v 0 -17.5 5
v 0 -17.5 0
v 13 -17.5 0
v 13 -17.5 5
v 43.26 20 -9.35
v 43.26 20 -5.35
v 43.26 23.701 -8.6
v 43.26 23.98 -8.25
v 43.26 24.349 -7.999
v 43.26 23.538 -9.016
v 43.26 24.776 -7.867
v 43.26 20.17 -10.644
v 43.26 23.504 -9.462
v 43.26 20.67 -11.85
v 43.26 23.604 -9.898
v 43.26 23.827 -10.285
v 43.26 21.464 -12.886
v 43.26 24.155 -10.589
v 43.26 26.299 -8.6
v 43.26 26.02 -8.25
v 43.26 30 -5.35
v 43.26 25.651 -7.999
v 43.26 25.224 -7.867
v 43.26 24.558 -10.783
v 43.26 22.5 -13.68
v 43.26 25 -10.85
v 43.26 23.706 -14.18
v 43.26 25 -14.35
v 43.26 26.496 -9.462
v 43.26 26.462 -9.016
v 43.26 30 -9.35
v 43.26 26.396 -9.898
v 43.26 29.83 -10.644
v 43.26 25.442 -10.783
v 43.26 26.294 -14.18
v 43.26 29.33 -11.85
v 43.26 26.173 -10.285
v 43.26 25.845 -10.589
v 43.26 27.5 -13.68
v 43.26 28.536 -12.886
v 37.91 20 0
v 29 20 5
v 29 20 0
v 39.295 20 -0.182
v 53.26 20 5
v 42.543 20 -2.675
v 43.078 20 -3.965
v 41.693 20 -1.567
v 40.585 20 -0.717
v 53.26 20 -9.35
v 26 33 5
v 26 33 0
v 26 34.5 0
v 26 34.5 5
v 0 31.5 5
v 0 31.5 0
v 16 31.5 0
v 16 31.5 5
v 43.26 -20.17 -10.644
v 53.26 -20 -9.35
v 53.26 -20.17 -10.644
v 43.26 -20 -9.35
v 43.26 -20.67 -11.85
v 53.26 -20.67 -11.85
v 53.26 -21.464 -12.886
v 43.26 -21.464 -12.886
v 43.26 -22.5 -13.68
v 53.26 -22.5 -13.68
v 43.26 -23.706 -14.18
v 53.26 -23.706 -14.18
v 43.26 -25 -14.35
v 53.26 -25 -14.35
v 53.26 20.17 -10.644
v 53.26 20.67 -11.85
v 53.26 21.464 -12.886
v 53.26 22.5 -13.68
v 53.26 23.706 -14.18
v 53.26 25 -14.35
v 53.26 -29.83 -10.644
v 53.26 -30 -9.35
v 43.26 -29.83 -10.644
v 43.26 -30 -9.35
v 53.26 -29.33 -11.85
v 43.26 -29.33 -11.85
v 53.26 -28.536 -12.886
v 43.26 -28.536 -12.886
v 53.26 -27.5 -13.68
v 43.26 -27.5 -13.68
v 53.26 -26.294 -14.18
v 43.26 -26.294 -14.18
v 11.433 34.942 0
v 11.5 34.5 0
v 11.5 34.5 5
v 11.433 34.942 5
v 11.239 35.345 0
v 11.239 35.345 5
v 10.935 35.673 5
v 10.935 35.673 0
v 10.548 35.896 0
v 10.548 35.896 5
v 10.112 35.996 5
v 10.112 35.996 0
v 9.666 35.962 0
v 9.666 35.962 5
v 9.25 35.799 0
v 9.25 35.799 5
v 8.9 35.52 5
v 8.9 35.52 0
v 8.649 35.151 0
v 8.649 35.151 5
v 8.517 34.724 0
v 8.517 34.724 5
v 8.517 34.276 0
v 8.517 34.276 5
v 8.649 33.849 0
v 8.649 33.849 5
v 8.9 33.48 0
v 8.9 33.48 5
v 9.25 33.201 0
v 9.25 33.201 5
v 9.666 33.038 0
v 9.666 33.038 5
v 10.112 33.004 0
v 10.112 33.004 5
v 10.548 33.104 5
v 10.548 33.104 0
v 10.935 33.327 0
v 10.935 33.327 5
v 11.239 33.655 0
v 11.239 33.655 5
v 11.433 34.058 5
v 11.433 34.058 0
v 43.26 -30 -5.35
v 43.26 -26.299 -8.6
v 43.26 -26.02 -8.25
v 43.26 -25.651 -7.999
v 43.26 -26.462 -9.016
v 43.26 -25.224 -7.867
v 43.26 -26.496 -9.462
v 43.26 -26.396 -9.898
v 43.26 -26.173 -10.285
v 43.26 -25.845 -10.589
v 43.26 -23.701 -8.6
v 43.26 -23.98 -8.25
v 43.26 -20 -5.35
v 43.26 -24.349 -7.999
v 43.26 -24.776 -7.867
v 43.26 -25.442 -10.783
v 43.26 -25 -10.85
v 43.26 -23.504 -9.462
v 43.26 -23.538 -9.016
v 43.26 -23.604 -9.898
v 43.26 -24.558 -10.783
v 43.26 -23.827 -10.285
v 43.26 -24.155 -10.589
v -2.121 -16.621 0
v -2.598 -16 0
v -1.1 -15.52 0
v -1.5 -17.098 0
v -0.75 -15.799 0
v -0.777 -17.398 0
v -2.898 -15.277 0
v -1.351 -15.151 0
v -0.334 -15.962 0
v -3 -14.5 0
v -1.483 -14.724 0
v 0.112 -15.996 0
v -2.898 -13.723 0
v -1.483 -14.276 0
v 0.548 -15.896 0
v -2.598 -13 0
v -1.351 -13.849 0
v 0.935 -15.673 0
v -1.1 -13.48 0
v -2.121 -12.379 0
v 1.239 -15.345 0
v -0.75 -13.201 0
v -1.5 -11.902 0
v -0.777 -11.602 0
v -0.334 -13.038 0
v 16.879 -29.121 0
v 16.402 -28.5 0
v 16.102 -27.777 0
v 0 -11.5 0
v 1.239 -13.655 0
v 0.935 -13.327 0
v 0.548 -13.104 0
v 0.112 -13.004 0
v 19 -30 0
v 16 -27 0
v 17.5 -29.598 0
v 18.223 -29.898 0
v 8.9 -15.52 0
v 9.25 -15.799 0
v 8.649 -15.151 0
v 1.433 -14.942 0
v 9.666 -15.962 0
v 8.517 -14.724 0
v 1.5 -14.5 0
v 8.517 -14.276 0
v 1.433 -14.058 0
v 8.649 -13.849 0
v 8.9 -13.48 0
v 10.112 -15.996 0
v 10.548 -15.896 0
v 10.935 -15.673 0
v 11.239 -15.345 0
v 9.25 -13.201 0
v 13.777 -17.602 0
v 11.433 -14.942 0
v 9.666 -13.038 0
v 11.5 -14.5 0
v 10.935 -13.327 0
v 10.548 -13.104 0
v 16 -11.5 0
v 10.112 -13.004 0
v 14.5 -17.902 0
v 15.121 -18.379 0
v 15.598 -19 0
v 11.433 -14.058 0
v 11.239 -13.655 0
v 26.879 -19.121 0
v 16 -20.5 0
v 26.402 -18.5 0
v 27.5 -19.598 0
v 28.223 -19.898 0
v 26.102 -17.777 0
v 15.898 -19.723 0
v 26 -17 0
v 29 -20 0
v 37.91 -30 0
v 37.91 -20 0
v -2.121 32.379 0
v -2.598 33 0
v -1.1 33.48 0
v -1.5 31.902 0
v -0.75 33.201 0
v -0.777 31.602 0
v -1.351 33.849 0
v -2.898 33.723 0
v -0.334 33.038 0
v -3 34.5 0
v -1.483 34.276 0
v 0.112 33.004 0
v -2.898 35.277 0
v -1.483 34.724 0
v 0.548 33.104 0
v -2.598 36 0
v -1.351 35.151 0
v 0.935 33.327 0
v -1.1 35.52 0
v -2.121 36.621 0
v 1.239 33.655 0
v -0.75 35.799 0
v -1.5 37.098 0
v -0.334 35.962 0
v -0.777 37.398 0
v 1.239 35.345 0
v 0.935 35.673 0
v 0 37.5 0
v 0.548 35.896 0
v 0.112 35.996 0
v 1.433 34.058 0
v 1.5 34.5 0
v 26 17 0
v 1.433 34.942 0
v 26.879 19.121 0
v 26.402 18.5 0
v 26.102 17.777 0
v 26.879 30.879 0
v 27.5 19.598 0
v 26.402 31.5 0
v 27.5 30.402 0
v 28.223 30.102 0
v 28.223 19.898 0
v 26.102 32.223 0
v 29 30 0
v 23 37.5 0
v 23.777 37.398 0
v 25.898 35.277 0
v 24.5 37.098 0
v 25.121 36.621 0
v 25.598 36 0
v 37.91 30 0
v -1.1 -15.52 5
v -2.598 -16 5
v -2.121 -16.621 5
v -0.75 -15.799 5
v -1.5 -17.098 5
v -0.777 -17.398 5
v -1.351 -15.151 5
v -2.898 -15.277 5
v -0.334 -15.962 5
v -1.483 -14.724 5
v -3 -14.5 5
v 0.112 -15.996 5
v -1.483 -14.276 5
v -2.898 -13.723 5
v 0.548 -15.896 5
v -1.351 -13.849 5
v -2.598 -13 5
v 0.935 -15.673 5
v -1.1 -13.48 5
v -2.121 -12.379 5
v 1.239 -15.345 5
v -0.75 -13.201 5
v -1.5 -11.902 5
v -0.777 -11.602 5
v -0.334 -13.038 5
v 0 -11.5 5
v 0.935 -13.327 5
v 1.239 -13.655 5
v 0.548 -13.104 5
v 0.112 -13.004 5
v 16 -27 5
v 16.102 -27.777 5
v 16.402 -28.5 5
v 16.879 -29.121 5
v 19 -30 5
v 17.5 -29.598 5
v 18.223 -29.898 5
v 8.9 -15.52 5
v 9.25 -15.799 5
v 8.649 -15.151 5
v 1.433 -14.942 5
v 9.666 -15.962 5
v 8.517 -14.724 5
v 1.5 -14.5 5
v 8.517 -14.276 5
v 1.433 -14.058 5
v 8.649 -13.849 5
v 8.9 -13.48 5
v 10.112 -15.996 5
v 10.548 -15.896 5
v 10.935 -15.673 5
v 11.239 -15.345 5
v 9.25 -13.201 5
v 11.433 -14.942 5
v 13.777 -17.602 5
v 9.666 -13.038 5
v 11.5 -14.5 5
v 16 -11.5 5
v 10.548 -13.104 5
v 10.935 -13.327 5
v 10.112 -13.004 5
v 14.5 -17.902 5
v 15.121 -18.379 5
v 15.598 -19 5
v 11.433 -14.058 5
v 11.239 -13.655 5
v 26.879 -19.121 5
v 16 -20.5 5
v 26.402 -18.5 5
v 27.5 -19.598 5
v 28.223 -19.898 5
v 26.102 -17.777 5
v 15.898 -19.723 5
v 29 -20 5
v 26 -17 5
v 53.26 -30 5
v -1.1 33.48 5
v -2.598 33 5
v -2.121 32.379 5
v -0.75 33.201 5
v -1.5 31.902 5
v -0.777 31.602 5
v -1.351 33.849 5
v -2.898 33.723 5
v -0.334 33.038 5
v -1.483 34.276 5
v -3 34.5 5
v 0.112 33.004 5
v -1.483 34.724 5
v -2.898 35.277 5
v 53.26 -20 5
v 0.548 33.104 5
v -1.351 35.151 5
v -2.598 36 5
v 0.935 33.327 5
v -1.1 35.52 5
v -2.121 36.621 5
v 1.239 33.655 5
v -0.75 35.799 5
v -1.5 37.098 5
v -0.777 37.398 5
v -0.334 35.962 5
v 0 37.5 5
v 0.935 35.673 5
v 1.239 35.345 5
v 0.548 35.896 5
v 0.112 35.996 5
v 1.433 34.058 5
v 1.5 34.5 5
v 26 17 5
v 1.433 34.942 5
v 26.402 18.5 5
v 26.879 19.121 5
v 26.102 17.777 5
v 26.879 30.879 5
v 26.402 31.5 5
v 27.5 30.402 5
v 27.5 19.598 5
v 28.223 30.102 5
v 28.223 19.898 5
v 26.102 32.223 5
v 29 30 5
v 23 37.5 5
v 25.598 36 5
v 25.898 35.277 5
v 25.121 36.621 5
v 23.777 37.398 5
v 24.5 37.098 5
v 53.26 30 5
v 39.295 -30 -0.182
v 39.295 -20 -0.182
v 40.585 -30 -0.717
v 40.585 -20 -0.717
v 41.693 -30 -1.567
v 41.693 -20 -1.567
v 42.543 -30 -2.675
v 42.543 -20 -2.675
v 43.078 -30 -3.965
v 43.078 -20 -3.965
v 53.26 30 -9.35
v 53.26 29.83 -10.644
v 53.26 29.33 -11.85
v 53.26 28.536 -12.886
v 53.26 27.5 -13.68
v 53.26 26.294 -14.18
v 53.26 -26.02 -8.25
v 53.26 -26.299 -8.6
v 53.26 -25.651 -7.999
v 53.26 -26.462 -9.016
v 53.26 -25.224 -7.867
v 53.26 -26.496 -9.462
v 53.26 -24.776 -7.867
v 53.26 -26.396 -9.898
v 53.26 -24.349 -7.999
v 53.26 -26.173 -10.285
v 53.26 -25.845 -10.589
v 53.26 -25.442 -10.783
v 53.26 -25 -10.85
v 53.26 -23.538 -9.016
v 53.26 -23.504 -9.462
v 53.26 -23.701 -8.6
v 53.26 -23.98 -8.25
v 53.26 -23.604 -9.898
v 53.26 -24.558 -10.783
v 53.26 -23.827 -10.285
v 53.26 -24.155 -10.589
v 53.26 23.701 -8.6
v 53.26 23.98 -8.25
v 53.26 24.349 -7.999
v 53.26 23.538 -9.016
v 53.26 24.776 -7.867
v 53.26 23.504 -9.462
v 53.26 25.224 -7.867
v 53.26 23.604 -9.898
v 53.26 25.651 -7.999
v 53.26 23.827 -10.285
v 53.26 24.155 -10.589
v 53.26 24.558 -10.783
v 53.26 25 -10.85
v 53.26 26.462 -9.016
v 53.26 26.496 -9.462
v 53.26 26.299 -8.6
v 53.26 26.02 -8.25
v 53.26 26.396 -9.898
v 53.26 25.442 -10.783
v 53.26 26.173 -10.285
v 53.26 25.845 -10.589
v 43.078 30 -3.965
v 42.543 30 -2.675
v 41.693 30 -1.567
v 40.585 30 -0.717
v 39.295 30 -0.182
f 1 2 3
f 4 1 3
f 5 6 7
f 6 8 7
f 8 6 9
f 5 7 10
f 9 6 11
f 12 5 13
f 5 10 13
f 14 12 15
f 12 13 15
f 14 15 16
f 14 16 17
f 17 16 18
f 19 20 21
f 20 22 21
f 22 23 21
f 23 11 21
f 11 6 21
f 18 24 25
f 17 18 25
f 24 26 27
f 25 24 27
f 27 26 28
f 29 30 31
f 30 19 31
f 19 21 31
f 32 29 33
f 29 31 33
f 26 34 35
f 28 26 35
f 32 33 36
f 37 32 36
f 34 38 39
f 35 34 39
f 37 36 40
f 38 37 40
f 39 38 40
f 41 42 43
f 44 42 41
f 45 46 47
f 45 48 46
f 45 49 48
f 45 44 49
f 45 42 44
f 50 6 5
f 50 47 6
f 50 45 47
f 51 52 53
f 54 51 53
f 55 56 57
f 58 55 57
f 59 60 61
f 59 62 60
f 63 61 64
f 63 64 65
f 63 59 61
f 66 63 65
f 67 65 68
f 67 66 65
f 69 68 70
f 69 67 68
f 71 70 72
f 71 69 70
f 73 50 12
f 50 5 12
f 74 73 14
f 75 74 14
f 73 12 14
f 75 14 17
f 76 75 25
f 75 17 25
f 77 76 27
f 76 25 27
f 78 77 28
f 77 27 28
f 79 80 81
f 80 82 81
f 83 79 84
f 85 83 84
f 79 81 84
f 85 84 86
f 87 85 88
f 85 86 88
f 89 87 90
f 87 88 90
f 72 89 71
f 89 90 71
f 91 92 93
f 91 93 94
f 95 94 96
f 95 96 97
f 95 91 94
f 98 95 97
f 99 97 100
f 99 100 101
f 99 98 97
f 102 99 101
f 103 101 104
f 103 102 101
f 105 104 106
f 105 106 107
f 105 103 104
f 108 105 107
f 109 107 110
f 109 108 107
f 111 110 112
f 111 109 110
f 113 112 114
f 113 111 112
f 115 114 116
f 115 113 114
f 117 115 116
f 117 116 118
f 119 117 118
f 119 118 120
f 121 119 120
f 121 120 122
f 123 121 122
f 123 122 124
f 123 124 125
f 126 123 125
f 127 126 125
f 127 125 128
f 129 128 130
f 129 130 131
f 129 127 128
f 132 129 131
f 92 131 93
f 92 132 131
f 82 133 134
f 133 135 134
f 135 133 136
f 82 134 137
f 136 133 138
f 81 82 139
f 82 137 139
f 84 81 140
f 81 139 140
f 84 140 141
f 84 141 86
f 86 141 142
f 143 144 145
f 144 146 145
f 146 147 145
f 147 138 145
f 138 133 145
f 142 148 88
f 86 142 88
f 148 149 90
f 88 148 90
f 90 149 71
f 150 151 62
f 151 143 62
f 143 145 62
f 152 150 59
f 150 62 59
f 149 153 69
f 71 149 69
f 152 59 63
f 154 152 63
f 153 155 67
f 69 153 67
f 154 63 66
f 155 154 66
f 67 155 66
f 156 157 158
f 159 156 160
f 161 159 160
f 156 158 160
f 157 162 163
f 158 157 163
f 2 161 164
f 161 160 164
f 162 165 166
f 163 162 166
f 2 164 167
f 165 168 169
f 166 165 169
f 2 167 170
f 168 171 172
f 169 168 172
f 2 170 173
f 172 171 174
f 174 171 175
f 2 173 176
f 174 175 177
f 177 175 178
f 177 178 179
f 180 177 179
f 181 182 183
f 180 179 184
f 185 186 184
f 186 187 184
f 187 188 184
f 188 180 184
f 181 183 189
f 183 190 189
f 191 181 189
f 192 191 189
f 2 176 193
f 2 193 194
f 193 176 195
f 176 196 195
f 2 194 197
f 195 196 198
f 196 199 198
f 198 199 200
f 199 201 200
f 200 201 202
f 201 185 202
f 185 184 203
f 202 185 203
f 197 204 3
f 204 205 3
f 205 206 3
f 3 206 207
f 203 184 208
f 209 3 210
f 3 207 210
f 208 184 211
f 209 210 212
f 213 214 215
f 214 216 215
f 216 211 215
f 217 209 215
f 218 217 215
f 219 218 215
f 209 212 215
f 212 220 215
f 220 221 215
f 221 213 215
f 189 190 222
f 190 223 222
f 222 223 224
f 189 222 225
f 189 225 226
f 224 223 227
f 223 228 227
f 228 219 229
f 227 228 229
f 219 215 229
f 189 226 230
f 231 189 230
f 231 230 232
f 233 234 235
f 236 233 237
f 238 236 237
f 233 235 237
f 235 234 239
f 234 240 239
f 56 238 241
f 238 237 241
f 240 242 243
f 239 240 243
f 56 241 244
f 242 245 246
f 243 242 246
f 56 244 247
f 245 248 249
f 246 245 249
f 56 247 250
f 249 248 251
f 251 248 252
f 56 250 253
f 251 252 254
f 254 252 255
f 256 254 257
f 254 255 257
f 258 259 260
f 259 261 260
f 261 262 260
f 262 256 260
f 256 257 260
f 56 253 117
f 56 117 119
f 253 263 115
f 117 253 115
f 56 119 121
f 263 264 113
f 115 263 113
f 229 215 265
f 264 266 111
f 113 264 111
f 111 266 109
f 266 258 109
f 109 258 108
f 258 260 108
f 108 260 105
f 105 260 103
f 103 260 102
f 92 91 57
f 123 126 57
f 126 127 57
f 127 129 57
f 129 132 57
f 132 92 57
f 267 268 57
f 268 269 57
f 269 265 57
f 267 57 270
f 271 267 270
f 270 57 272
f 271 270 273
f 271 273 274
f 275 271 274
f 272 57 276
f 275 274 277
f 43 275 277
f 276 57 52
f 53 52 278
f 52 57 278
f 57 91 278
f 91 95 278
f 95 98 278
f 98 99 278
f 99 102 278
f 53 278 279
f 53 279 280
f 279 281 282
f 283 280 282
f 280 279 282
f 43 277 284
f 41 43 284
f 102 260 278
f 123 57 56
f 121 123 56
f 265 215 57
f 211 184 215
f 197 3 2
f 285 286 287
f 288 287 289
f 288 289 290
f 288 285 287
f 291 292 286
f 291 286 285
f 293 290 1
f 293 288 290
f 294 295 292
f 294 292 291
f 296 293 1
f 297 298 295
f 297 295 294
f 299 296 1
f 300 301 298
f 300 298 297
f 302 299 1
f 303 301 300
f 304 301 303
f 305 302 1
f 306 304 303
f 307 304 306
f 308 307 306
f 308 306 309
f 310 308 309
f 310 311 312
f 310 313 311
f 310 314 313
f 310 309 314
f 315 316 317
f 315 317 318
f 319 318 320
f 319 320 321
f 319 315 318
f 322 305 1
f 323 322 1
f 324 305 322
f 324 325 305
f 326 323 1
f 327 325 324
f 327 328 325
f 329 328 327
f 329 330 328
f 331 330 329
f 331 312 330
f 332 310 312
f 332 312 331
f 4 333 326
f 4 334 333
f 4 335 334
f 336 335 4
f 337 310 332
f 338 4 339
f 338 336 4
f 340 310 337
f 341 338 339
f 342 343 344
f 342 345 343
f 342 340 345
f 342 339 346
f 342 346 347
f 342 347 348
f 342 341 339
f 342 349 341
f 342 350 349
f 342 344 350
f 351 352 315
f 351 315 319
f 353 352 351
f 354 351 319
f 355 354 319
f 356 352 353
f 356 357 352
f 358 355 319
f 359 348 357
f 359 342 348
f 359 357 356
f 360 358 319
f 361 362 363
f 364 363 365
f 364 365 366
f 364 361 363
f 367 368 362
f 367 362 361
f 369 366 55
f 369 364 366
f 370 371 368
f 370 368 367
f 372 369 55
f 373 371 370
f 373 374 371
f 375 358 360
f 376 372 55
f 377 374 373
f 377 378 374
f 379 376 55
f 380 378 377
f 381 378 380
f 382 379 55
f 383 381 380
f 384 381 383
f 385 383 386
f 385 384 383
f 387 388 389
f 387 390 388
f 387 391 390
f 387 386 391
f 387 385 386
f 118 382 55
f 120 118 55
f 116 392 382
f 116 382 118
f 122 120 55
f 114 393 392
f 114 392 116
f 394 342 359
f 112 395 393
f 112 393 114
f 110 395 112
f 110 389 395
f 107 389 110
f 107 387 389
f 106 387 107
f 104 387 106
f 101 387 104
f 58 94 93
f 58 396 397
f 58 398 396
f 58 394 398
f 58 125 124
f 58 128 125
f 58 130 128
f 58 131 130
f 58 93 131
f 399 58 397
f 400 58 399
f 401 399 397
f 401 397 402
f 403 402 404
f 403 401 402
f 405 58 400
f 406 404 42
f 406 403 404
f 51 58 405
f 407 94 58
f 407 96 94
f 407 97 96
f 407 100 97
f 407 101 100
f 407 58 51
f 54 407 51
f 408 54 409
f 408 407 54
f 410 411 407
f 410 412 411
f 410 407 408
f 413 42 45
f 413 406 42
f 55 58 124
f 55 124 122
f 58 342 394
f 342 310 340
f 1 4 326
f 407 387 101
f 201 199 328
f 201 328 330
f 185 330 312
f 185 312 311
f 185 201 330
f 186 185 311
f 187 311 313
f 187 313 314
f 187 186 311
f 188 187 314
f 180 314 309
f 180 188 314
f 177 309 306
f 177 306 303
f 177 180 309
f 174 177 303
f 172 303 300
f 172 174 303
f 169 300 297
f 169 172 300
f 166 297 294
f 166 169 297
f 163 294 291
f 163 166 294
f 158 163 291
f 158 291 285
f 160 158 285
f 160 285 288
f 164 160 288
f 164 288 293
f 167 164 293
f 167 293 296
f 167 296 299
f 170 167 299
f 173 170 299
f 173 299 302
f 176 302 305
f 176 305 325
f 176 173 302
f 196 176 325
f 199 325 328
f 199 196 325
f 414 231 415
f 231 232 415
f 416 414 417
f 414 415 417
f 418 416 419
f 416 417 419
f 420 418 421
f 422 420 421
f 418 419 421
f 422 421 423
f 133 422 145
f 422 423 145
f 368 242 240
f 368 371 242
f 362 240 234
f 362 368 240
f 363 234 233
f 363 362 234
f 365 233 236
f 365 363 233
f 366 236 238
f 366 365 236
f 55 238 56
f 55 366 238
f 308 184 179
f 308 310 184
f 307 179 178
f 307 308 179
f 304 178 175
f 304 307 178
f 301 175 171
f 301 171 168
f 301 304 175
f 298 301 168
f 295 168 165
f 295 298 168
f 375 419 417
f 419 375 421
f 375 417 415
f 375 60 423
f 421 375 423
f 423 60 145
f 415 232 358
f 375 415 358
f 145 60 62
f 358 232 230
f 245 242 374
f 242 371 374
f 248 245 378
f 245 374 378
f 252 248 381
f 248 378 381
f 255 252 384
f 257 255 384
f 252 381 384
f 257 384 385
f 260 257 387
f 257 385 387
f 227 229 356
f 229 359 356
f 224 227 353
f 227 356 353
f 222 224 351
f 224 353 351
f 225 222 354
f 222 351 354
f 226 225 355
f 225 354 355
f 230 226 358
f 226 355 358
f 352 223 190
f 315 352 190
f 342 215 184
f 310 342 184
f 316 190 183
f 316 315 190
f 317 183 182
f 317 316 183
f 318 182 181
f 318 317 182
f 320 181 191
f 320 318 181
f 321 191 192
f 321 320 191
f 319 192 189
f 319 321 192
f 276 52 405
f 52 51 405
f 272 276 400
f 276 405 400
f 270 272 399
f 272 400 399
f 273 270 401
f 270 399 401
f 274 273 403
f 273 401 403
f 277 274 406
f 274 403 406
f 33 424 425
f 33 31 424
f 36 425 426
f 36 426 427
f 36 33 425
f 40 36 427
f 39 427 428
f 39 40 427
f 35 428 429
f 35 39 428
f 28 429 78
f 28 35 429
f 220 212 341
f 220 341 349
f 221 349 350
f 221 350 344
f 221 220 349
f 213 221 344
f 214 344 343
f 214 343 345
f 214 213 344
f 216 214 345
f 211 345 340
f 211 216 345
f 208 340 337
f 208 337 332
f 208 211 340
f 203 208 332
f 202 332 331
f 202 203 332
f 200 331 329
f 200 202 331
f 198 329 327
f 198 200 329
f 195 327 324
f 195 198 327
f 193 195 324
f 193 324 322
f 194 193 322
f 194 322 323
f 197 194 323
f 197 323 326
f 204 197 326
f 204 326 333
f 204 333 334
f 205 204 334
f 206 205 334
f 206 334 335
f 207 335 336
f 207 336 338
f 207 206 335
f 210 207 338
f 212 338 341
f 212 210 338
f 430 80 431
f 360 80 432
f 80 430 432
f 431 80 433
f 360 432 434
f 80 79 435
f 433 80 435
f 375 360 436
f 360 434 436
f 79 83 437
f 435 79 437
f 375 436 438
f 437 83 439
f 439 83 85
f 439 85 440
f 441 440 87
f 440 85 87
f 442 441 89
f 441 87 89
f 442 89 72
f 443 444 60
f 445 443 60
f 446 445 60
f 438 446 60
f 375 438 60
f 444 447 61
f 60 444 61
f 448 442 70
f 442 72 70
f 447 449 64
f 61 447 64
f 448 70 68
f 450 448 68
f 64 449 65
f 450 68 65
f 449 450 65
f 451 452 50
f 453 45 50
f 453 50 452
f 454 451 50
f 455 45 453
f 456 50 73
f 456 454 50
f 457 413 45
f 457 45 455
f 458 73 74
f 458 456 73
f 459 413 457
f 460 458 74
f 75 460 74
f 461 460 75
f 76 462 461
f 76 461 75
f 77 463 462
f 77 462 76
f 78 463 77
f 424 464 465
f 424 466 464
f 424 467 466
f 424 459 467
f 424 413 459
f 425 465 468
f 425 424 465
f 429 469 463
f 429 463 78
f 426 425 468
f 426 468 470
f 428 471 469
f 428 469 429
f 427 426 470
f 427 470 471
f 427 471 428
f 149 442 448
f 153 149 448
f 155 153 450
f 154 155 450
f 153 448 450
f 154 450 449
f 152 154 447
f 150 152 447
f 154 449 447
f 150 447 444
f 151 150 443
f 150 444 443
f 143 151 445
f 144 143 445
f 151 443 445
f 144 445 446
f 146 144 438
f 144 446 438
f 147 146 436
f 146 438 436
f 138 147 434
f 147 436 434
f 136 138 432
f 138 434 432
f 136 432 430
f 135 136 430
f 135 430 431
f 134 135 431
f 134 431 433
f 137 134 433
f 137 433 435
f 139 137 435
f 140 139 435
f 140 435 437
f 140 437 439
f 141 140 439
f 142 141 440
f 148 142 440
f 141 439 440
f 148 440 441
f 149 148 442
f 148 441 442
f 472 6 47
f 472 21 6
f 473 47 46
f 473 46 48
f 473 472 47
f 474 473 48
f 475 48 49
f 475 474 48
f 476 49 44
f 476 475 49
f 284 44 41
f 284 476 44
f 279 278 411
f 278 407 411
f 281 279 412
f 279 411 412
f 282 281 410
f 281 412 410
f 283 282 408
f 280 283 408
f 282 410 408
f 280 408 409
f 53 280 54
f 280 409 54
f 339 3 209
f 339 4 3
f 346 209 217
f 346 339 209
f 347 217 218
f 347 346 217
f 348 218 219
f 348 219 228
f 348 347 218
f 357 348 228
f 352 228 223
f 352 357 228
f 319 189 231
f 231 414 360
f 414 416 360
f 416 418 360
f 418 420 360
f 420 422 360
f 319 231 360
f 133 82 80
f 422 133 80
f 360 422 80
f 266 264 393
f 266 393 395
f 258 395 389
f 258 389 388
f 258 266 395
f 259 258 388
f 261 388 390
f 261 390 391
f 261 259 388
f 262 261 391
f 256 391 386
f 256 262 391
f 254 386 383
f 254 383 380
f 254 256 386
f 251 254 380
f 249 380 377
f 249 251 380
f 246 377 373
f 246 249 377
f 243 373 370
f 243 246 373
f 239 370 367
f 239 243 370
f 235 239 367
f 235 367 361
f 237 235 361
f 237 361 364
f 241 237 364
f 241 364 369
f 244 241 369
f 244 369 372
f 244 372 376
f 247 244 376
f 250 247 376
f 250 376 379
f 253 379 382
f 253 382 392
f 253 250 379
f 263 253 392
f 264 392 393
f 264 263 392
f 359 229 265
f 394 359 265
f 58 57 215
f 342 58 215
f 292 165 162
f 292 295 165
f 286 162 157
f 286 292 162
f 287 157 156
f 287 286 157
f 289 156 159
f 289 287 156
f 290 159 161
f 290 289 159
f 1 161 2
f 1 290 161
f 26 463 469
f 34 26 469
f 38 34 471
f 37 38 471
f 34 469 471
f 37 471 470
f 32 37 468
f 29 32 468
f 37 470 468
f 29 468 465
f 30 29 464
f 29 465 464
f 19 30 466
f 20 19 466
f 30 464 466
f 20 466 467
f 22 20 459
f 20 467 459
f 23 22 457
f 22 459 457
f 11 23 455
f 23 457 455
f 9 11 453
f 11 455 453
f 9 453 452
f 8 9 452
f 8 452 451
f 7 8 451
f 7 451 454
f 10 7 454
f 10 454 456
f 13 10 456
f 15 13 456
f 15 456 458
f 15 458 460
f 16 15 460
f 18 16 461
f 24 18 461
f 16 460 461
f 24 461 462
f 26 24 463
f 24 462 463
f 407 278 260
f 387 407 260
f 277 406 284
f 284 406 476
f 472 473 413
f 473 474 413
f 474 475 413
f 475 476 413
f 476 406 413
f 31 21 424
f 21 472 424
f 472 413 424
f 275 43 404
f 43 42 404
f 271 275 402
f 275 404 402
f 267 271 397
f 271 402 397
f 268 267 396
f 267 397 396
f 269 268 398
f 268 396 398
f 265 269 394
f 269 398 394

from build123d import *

# Parameters (mm, degrees)
SKETCH_1_R      = 1.5
EXTRUDE_1_DEPTH = 5
FILLET_1_R      = 3
SKETCH_2_W      = 14.35
SKETCH_2_H      = 10
SKETCH_2_R      = 1.5
EXTRUDE_2_DEPTH = 10
FILLET_2_R      = 5
FILLET_4_R      = 5.35


with BuildPart() as part:
    # 草图1 → 凸台-拉伸1 (new body)
    with BuildSketch(Plane.XY):
        Polygon((-3, 37.5), (-3, 31.5), (16, 31.5), (16, -11.5), (-3, -11.5), (-3, -17.5), (16, -17.5), (16, -30), (26, -30), (53.26, -30), (53.26, -20), (26, -20), (26, -17.5), (26, 20), (53.26, 20), (53.26, 30), (26, 30), (26, 37.5), align=None)
        with Locations((0, -14.5)):
            Circle(SKETCH_1_R, mode=Mode.SUBTRACT)
        with Locations((0, 34.5)):
            Circle(SKETCH_1_R, mode=Mode.SUBTRACT)
        with Locations((10, 34.5)):
            Circle(SKETCH_1_R, mode=Mode.SUBTRACT)
        with Locations((10, -14.5)):
            Circle(SKETCH_1_R, mode=Mode.SUBTRACT)
    extrude(amount=EXTRUDE_1_DEPTH)

    # 圆角1
    fillet_1_edges = [part.edges().sort_by_distance(p)[0] for p in [
        (26, 20, 2.5),
        (26, -20, 2.5),
        (26, 30, 2.5),
        (26, 37.5, 2.5),
        (16, -30, 2.5),
        (16, -17.5, 2.5),
        (-3, -17.5, 2.5),
        (-3, -11.5, 2.5),
        (-3, 37.5, 2.5),
        (-3, 31.5, 2.5),
    ]]
    fillet(fillet_1_edges, radius=FILLET_1_R - 0.0001)  # a hair under: the kernel refuses the full size

    # 草图2 → 凸台-拉伸2 (add)
    # profile 1 of 2: a face of its own
    with BuildSketch(Plane(origin=(53.26, 0, 0), x_dir=(0, 0, -1), z_dir=(1, 0, 0))):
        with Locations((7.175, 25)):
            Rectangle(SKETCH_2_W, SKETCH_2_H)
        with Locations((9.35, 25)):
            Circle(SKETCH_2_R, mode=Mode.SUBTRACT)
    # profile 2 of 2: a face of its own
    with BuildSketch(Plane(origin=(53.26, 0, 0), x_dir=(0, 0, -1), z_dir=(1, 0, 0))):
        with Locations((7.175, -25)):
            Rectangle(SKETCH_2_W, SKETCH_2_H)
        with Locations((9.35, -25)):
            Circle(SKETCH_2_R, mode=Mode.SUBTRACT)
    extrude(amount=-EXTRUDE_2_DEPTH)

    # 圆角2
    fillet_2_edges = [part.edges().sort_by_distance(p)[0] for p in [
        (48.26, 30, -14.35),
        (48.26, 20, -14.35),
        (48.26, -20, -14.35),
        (48.26, -30, -14.35),
    ]]
    fillet(fillet_2_edges, radius=FILLET_2_R - 0.0001)  # a hair under: the kernel refuses the full size

    # 圆角4
    fillet_4_edges = [part.edges().sort_by_distance(p)[0] for p in [
        (43.26, 25, 0),
        (43.26, -25, 0),
    ]]
    fillet(fillet_4_edges, radius=FILLET_4_R)


solid = part.part
